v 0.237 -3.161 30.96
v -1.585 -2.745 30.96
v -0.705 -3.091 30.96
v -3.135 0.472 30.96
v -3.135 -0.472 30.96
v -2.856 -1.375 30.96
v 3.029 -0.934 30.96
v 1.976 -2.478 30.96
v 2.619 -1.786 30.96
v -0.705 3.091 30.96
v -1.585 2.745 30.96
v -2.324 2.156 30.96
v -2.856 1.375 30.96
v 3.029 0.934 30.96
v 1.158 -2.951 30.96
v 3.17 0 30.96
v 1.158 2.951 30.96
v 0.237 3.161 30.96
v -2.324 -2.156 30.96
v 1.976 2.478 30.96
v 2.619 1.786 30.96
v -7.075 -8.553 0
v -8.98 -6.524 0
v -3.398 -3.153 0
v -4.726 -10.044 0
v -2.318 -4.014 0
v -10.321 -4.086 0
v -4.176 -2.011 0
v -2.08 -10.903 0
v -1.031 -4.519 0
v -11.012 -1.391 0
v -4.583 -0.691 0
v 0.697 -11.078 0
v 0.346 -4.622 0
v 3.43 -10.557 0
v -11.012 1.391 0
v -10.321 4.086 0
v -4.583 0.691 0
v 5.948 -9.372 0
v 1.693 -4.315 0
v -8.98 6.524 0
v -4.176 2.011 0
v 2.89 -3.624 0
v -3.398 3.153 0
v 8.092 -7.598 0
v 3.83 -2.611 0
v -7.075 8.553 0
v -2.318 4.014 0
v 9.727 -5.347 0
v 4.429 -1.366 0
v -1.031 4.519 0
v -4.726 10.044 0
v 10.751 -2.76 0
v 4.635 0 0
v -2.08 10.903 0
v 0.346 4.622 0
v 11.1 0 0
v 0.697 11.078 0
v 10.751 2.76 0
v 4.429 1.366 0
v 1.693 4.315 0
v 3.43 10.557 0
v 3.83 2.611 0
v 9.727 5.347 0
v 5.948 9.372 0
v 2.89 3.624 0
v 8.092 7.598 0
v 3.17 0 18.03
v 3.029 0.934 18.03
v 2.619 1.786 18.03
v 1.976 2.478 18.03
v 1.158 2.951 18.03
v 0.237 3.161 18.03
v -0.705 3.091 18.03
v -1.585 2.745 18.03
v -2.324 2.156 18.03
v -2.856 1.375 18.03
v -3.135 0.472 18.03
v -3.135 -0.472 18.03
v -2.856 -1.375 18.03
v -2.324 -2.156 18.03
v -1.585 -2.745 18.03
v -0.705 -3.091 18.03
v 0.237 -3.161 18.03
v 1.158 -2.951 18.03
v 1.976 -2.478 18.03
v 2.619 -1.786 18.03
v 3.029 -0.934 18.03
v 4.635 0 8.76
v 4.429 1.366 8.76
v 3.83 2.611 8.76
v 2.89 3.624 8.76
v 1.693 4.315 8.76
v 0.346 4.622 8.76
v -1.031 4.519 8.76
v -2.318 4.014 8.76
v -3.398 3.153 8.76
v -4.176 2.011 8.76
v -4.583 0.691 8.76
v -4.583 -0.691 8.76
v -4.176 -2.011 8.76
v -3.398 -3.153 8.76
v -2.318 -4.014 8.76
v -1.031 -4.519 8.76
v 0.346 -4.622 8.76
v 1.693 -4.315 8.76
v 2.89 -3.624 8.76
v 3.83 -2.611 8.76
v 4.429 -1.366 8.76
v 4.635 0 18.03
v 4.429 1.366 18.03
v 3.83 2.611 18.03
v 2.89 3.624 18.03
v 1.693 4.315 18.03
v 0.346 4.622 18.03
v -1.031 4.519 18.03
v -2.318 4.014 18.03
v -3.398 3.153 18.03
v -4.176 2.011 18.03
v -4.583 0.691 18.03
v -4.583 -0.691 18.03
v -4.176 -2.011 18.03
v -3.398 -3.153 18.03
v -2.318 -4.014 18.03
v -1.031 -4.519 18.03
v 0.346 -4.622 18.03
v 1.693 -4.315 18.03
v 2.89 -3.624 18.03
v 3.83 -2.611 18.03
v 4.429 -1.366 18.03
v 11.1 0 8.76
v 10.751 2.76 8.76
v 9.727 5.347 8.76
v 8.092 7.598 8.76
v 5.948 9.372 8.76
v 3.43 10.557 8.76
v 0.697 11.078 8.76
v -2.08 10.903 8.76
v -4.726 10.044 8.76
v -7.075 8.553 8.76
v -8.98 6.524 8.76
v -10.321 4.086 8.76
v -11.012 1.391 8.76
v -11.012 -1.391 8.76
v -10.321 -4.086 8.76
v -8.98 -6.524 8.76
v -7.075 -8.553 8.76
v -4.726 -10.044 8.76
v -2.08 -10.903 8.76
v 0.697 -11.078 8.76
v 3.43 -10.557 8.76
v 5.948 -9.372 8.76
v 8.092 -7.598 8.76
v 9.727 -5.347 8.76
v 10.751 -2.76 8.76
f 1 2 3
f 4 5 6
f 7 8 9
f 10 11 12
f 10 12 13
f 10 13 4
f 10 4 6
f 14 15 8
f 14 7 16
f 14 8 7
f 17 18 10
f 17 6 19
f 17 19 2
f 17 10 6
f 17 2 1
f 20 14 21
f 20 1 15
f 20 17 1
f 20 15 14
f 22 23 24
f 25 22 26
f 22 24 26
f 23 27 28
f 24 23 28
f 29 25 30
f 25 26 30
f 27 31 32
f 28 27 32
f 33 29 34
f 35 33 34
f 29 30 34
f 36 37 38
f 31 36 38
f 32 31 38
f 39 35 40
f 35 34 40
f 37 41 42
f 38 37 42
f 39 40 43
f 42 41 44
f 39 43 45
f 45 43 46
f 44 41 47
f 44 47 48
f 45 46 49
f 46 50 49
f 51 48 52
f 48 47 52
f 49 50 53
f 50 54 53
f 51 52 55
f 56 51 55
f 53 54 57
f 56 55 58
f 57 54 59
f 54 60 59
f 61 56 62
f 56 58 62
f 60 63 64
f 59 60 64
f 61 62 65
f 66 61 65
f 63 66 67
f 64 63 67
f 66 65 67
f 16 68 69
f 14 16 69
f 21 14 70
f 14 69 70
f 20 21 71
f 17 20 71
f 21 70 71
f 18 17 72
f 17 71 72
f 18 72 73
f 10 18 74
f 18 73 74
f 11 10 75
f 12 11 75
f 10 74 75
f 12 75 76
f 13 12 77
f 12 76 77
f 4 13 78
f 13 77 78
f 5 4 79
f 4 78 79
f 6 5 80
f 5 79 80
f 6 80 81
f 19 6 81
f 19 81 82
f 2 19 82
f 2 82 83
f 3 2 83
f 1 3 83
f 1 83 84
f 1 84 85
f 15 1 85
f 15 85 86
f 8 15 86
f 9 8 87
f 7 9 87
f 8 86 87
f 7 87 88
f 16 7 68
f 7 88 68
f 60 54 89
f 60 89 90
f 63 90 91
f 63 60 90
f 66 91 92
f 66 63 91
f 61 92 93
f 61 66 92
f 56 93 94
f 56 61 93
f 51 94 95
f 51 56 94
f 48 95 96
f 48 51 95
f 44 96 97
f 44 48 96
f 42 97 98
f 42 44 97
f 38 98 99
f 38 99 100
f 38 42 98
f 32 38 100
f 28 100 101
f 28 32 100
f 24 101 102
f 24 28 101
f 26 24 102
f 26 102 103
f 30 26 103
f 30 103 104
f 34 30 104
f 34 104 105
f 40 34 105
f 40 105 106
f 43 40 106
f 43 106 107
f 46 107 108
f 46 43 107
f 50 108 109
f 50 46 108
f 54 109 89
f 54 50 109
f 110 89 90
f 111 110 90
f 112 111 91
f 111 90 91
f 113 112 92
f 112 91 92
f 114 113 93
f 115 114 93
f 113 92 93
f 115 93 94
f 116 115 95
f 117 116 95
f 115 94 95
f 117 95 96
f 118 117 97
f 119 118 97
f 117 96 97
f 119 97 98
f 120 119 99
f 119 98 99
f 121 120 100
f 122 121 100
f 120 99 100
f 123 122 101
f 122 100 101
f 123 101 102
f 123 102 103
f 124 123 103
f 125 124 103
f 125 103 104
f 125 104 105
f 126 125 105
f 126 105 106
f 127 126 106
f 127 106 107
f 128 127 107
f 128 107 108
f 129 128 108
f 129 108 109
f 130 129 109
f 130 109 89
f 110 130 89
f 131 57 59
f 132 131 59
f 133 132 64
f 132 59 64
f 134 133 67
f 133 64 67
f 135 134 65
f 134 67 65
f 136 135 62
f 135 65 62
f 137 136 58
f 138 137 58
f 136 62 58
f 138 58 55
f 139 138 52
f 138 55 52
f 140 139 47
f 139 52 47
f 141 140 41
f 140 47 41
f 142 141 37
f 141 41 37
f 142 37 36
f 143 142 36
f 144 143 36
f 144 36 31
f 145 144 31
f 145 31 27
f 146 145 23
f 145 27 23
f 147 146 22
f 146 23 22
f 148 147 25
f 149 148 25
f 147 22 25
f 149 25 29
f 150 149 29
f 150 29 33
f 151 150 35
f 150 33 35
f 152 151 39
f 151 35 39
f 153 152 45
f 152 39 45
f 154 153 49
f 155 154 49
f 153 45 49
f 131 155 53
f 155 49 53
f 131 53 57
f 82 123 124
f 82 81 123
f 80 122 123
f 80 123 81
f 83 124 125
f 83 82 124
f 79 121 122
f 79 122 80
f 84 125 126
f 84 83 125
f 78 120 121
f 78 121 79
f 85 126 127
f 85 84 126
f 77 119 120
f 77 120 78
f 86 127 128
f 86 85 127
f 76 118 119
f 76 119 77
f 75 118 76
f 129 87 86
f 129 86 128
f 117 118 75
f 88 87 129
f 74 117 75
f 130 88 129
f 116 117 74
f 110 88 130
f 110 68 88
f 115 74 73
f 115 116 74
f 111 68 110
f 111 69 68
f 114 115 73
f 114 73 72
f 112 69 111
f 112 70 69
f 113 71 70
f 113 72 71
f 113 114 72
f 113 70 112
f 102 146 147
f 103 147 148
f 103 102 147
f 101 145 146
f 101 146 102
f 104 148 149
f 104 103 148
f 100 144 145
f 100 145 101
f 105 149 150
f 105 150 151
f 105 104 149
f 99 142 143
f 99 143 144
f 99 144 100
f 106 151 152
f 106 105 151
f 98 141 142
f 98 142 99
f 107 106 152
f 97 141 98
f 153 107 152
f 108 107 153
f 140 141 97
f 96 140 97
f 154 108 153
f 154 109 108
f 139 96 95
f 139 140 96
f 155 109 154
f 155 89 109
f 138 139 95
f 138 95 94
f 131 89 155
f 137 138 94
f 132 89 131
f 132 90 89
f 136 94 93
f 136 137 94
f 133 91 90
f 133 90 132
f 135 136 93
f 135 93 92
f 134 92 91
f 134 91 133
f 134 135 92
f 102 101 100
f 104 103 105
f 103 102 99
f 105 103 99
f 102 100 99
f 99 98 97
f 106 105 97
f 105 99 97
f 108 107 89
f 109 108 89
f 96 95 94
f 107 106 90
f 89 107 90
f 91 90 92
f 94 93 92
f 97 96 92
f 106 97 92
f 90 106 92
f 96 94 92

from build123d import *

# Parameters (mm, degrees)
SKETCH1_R           = 11.1
SKETCH1_R_2         = 4.635
BOSS_EXTRUDE1_DEPTH = 8.76
SKETCH3_R           = 4.635
BOSS_EXTRUDE2_DEPTH = 22.2
CUT_EXTRUDE3_START  = -12.93
SKETCH4_R           = 4.635
SKETCH4_R_2         = 3.17
CUT_EXTRUDE3_DEPTH  = 12.93


with BuildPart() as part:
    # Sketch1 → Boss-Extrude1 (new body)
    with BuildSketch(Plane.XY):
        Circle(SKETCH1_R)
        Circle(SKETCH1_R_2, mode=Mode.SUBTRACT)
    extrude(amount=BOSS_EXTRUDE1_DEPTH)


with BuildPart() as body_2:
    # Sketch3 → Boss-Extrude2 (new body)
    with BuildSketch(Plane.XY.offset(8.76)):
        Circle(SKETCH3_R)
    extrude(amount=BOSS_EXTRUDE2_DEPTH)

    # Sketch4 → Cut-Extrude3 (cut)
    with BuildSketch(Plane.XY.offset(30.96).offset(CUT_EXTRUDE3_START)):
        Circle(SKETCH4_R)
        Circle(SKETCH4_R_2, mode=Mode.SUBTRACT)
    extrude(amount=CUT_EXTRUDE3_DEPTH, mode=Mode.SUBTRACT)


solid = Compound([part.part, body_2.part])
